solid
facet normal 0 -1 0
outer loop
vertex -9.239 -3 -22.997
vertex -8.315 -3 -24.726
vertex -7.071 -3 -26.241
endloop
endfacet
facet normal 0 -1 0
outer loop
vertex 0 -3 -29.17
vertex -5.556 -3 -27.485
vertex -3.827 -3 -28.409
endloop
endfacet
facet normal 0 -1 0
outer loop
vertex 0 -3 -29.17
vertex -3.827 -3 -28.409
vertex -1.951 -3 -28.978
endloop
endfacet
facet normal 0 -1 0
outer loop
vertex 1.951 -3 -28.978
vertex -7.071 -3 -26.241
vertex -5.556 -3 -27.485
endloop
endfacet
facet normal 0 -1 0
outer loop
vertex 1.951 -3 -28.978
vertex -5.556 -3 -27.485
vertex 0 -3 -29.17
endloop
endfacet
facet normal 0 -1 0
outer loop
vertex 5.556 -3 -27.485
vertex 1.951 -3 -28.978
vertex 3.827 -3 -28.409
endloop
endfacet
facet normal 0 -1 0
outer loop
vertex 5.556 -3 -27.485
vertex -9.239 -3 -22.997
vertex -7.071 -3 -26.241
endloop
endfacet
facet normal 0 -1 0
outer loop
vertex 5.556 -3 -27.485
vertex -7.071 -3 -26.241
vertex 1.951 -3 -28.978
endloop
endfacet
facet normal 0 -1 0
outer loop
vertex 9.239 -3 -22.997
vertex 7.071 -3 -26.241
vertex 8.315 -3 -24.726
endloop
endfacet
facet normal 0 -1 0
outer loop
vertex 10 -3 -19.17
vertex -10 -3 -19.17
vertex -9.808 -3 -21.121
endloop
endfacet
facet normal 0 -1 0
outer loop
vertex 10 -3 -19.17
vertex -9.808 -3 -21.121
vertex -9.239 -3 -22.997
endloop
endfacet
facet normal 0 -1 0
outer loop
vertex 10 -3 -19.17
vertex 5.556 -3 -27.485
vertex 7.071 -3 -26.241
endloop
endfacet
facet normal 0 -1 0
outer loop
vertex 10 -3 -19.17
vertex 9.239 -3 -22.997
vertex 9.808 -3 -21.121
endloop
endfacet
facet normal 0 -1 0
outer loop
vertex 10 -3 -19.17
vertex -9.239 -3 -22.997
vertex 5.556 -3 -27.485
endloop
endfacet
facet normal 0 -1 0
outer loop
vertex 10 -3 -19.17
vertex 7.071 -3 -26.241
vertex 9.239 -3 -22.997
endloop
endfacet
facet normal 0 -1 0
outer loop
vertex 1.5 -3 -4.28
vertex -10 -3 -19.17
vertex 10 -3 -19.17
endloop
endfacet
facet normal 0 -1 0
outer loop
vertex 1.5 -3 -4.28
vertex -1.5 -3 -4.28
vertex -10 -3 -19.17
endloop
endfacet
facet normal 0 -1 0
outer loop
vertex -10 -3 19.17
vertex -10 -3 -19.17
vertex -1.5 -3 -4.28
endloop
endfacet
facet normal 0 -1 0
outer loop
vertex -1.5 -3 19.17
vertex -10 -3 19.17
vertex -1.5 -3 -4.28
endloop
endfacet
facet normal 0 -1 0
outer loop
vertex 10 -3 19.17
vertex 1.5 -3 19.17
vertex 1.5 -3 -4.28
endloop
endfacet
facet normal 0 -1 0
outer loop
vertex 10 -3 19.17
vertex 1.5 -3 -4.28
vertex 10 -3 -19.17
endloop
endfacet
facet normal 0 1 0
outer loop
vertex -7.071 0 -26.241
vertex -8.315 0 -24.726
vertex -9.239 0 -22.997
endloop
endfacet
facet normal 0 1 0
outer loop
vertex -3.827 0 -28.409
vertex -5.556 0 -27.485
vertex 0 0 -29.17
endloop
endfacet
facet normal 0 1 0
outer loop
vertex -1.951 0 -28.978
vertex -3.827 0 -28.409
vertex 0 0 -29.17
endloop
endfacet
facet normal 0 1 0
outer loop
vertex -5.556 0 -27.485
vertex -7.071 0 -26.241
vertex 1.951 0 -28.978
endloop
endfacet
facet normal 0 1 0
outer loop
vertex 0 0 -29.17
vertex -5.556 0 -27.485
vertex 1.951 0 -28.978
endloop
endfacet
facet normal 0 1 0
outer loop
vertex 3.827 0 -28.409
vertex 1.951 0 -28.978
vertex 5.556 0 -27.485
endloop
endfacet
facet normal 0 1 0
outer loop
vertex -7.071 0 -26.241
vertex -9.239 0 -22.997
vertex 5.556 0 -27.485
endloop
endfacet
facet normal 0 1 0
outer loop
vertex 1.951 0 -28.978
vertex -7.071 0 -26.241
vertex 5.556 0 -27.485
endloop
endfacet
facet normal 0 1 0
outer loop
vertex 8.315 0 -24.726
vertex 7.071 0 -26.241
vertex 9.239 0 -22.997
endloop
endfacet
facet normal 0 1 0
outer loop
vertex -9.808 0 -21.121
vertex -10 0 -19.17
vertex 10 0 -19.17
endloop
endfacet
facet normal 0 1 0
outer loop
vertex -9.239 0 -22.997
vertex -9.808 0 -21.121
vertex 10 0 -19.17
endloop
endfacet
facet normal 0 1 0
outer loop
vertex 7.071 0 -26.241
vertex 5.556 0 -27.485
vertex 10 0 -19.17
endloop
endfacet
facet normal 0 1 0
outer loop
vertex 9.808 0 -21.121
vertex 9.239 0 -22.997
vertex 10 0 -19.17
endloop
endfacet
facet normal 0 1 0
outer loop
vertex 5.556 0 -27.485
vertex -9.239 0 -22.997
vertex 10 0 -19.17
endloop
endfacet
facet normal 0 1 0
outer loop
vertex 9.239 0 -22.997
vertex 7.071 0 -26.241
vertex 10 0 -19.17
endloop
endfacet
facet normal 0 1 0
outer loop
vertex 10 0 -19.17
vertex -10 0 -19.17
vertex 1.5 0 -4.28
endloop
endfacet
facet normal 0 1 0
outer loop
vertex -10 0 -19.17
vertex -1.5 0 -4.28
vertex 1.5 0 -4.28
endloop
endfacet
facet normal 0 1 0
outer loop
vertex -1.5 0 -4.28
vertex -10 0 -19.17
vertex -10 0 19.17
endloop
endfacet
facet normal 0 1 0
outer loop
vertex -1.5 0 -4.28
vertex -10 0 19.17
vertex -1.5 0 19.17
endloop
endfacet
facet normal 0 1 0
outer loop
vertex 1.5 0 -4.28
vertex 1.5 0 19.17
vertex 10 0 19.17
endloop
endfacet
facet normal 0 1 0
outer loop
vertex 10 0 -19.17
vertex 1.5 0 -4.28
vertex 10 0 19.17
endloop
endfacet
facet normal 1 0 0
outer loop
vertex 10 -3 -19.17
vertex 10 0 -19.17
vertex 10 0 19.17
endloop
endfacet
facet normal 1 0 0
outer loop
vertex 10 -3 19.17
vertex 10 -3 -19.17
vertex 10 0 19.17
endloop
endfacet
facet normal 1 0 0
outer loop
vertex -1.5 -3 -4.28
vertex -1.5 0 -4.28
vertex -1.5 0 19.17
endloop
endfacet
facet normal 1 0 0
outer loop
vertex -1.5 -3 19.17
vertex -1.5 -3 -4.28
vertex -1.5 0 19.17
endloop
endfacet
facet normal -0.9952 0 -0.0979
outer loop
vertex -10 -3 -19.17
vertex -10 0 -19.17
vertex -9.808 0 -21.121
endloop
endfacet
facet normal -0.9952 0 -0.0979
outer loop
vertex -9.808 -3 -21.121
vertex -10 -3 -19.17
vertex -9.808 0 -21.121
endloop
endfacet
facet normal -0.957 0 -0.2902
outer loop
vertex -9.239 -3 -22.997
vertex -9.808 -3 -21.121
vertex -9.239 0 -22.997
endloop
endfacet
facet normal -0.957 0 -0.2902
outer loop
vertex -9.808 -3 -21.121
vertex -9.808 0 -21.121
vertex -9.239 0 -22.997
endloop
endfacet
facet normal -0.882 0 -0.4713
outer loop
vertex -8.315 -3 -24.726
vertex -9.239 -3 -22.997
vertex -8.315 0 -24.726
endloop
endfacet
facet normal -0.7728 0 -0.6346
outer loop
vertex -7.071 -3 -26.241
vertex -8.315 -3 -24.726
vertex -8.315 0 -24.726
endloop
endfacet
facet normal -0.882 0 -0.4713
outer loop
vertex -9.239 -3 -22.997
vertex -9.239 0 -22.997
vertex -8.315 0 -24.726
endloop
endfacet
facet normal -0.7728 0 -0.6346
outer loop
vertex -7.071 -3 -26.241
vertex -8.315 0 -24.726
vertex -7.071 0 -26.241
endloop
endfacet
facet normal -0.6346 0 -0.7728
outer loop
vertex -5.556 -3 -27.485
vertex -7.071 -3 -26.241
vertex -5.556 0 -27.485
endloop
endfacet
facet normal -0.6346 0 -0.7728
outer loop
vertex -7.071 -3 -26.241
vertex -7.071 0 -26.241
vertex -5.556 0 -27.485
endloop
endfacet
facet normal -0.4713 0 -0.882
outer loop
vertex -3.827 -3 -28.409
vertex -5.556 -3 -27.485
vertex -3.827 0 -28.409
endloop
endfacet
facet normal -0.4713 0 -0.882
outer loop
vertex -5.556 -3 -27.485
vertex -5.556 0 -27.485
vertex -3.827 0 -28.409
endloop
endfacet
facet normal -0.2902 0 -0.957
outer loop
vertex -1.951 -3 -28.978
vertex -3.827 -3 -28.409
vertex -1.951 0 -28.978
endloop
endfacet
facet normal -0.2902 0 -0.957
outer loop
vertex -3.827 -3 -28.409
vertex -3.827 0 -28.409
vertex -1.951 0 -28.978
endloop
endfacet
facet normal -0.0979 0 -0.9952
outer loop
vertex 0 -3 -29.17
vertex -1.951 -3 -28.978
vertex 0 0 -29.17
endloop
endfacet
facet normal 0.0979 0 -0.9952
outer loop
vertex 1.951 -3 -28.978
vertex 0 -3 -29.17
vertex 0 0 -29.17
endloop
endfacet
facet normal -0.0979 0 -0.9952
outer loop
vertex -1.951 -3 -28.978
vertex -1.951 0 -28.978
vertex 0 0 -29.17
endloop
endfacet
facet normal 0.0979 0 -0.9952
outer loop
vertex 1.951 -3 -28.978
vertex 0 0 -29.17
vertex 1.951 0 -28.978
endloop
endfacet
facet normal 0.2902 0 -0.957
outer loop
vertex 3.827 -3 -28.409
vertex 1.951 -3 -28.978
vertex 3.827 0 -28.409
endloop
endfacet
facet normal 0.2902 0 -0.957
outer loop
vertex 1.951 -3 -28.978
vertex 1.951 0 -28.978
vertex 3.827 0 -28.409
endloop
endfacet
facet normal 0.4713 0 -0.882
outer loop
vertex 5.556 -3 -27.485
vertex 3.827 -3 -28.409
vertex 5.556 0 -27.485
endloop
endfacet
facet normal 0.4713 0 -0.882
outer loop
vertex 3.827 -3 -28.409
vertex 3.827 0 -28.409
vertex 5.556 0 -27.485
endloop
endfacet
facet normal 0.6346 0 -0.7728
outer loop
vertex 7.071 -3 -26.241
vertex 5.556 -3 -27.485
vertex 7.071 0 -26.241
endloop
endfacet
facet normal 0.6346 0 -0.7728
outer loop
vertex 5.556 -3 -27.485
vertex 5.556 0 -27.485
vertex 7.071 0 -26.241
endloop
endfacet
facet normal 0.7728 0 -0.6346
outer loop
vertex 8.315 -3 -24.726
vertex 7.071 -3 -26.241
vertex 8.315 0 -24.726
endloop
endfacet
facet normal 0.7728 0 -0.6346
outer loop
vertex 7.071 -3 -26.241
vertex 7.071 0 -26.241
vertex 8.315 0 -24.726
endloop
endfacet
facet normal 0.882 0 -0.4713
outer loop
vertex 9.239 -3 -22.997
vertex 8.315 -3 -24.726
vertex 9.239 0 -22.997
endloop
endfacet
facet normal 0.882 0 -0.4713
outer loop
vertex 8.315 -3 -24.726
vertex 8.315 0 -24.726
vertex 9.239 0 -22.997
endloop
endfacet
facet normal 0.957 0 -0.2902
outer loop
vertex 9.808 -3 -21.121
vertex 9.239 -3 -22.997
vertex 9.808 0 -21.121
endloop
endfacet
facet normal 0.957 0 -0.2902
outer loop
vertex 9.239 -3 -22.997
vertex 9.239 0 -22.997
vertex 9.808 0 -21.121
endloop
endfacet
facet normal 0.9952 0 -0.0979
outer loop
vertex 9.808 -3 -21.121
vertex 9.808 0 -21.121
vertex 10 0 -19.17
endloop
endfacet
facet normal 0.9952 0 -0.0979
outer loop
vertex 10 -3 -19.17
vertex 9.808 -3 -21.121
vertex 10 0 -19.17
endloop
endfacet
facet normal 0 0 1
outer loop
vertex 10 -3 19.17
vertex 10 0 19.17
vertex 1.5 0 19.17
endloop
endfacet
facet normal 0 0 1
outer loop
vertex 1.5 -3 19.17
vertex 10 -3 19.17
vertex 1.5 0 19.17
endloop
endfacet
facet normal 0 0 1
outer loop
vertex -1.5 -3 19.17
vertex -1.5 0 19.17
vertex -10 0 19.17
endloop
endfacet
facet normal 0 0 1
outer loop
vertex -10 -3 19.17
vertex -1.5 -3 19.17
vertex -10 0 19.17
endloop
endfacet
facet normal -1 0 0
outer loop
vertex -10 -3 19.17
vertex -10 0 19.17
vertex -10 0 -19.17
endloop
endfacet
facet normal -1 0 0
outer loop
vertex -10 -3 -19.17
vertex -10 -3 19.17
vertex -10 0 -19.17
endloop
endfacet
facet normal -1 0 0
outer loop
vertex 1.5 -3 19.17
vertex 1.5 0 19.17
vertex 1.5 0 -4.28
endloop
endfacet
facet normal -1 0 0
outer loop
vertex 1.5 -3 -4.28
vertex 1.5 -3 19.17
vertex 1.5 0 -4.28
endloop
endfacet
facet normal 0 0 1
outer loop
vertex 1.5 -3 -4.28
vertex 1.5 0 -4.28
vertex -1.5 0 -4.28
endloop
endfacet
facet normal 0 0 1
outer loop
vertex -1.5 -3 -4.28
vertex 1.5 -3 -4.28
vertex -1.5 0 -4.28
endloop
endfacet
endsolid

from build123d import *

# Parameters (mm, degrees)
F1_DEPTH = 3


with BuildPart() as f1:
    # F0 (on Front) → F1 (new body)
    with BuildSketch(Plane.XZ):
        with BuildLine():
            Line((10, -19.17), (10, 19.17))
            Line((10, 19.17), (1.5, 19.17))
            Line((1.5, 19.17), (1.5, -4.28))
            Line((1.5, -4.28), (-1.5, -4.28))
            Line((-1.5, -4.28), (-1.5, 19.17))
            Line((-1.5, 19.17), (-10, 19.17))
            Line((-10, 19.17), (-10, -19.17))
            ThreePointArc((-10, -19.17), (0, -29.17), (10, -19.17))
        make_face()
    extrude(amount=F1_DEPTH)


solid = f1.part
